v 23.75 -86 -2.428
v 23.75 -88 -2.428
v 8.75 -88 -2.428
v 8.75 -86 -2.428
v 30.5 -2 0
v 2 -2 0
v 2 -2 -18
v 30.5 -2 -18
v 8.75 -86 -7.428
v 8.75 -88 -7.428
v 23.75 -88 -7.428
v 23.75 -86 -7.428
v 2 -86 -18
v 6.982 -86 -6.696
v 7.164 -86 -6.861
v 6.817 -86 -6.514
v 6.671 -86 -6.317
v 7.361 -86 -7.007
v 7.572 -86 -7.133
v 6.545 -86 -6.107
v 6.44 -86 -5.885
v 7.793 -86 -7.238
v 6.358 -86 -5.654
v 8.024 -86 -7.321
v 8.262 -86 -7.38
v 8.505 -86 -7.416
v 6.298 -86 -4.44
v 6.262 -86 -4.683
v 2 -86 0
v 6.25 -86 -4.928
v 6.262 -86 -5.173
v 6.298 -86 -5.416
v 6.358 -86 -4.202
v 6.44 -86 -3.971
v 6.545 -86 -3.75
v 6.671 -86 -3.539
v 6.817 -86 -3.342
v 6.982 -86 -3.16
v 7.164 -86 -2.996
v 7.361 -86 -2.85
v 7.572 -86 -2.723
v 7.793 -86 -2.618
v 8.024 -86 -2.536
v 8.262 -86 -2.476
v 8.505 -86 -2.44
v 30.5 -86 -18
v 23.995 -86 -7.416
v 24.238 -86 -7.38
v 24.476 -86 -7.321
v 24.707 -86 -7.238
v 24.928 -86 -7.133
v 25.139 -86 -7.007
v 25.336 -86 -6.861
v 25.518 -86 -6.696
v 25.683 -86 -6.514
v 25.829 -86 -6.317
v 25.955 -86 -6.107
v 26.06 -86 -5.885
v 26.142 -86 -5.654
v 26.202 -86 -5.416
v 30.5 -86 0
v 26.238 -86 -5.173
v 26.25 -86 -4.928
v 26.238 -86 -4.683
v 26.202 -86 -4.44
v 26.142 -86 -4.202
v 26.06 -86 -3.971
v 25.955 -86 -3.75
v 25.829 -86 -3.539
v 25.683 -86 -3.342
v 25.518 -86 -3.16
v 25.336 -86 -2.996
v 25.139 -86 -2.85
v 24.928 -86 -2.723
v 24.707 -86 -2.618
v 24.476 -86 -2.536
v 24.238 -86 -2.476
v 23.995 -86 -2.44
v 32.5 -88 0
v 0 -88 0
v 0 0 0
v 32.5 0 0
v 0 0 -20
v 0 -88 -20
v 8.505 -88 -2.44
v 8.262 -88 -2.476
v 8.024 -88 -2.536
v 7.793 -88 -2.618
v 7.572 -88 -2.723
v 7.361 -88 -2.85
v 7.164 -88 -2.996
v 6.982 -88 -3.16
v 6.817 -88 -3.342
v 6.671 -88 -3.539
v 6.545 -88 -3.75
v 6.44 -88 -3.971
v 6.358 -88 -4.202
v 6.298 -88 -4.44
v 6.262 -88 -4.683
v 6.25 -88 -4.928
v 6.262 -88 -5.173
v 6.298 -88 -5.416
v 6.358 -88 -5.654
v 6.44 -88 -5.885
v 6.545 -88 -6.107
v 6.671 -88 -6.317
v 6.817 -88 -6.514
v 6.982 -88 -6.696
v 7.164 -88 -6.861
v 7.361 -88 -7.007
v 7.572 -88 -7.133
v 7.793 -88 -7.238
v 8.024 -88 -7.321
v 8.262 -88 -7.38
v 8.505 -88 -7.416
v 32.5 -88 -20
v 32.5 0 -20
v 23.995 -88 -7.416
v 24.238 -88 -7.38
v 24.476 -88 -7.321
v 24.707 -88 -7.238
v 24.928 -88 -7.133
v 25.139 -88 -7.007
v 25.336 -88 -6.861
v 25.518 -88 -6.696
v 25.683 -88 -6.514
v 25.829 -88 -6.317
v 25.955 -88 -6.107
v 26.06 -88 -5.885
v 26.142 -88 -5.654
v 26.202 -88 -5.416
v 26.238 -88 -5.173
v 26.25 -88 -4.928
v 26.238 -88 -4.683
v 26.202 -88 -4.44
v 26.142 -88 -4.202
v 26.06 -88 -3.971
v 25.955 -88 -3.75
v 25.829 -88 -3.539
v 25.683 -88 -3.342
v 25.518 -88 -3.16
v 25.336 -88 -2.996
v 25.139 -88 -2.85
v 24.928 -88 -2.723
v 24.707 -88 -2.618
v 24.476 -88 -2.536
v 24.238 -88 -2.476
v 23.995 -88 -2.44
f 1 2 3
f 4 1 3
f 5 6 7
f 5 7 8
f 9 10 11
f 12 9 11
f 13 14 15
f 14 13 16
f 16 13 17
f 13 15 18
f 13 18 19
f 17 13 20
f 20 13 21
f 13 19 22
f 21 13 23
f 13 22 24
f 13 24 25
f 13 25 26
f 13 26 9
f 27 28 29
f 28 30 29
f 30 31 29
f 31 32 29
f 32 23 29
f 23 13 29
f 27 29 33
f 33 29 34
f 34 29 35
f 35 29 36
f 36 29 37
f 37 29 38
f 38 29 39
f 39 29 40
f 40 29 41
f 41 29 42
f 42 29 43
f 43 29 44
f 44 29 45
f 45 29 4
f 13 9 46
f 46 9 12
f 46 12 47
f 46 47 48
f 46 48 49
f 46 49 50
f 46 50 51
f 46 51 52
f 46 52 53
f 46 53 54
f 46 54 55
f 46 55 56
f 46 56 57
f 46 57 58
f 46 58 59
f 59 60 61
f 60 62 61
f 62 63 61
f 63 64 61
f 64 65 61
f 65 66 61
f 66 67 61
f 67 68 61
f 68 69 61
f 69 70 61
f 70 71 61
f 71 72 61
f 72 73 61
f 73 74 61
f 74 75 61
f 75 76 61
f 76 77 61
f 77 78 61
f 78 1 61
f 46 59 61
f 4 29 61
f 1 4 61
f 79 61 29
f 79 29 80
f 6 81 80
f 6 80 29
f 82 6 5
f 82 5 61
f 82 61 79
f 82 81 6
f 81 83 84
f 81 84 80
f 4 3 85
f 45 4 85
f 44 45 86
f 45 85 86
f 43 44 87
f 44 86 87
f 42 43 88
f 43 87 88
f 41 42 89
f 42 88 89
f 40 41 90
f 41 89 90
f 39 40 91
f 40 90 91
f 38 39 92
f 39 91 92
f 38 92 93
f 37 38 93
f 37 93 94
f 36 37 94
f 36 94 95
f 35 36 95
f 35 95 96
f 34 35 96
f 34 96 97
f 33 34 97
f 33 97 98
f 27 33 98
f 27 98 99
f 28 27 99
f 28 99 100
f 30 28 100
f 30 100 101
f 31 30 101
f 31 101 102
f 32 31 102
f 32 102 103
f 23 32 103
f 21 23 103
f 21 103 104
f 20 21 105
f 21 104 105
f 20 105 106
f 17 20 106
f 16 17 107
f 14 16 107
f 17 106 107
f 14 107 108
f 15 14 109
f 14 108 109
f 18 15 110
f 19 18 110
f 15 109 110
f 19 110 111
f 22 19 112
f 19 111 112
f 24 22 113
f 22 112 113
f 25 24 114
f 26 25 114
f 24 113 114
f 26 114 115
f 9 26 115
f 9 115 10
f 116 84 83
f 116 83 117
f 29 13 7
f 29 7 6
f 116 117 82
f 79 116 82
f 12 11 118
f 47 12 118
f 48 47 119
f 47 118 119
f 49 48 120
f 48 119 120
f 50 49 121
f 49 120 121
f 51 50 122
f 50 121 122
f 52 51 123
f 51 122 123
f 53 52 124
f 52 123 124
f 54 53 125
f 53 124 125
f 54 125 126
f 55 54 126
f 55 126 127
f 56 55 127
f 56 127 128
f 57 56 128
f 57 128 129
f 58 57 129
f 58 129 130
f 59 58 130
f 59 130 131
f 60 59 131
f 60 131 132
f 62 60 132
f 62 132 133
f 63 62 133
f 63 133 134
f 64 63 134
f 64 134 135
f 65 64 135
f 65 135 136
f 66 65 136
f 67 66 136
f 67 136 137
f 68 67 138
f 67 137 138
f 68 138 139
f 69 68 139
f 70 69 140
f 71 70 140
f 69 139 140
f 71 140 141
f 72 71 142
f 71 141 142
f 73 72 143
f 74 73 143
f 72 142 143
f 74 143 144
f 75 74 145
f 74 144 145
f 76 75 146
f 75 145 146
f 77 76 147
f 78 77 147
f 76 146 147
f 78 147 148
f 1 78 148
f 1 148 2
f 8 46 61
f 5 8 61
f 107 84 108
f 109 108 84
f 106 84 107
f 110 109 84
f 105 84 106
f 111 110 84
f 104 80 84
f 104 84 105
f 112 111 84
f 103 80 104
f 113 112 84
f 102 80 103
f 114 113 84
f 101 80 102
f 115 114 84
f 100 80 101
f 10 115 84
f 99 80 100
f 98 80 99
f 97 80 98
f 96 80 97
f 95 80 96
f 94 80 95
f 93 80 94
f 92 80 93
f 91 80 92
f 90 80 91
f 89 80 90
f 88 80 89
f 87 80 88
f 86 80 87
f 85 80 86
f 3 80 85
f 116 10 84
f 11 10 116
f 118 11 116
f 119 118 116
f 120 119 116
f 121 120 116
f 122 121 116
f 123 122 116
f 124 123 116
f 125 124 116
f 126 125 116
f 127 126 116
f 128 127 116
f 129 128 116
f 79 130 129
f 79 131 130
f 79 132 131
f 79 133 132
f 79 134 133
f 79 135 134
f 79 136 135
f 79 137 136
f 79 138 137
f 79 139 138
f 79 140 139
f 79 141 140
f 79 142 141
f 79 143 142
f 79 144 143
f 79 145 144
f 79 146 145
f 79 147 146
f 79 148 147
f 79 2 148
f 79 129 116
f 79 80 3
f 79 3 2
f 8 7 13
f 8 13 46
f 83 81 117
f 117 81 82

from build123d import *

# Parameters (mm, degrees)
F0_W     = 32.5
F0_H     = 20
F1_DEPTH = 88
F2_T     = -2
F4_DEPTH = 25


with BuildPart() as f1:
    # F0 (on Front) → F1 (new body)
    with BuildSketch(Plane.XZ):
        with Locations((16.25, -10)):
            Rectangle(F0_W, F0_H)
    extrude(amount=F1_DEPTH)

    # F2
    f2_openings = [f1.faces().sort_by_distance(p)[0] for p in [
        (16.25, -44, 0),
    ]]
    offset(amount=F2_T, openings=f2_openings)

    # F3 (on face) → F4 (cut)
    with BuildSketch(Plane.XZ.offset(88)):
        with BuildLine():
            Line((23.75, -2.428177), (8.75, -2.428177))
            ThreePointArc((8.75, -2.428177), (6.25, -4.928177), (8.75, -7.428177))
            Line((8.75, -7.428177), (23.75, -7.428177))
            ThreePointArc((23.75, -7.428177), (26.25, -4.928177), (23.75, -2.428177))
        make_face()
    extrude(amount=-F4_DEPTH, mode=Mode.SUBTRACT)


solid = f1.part
